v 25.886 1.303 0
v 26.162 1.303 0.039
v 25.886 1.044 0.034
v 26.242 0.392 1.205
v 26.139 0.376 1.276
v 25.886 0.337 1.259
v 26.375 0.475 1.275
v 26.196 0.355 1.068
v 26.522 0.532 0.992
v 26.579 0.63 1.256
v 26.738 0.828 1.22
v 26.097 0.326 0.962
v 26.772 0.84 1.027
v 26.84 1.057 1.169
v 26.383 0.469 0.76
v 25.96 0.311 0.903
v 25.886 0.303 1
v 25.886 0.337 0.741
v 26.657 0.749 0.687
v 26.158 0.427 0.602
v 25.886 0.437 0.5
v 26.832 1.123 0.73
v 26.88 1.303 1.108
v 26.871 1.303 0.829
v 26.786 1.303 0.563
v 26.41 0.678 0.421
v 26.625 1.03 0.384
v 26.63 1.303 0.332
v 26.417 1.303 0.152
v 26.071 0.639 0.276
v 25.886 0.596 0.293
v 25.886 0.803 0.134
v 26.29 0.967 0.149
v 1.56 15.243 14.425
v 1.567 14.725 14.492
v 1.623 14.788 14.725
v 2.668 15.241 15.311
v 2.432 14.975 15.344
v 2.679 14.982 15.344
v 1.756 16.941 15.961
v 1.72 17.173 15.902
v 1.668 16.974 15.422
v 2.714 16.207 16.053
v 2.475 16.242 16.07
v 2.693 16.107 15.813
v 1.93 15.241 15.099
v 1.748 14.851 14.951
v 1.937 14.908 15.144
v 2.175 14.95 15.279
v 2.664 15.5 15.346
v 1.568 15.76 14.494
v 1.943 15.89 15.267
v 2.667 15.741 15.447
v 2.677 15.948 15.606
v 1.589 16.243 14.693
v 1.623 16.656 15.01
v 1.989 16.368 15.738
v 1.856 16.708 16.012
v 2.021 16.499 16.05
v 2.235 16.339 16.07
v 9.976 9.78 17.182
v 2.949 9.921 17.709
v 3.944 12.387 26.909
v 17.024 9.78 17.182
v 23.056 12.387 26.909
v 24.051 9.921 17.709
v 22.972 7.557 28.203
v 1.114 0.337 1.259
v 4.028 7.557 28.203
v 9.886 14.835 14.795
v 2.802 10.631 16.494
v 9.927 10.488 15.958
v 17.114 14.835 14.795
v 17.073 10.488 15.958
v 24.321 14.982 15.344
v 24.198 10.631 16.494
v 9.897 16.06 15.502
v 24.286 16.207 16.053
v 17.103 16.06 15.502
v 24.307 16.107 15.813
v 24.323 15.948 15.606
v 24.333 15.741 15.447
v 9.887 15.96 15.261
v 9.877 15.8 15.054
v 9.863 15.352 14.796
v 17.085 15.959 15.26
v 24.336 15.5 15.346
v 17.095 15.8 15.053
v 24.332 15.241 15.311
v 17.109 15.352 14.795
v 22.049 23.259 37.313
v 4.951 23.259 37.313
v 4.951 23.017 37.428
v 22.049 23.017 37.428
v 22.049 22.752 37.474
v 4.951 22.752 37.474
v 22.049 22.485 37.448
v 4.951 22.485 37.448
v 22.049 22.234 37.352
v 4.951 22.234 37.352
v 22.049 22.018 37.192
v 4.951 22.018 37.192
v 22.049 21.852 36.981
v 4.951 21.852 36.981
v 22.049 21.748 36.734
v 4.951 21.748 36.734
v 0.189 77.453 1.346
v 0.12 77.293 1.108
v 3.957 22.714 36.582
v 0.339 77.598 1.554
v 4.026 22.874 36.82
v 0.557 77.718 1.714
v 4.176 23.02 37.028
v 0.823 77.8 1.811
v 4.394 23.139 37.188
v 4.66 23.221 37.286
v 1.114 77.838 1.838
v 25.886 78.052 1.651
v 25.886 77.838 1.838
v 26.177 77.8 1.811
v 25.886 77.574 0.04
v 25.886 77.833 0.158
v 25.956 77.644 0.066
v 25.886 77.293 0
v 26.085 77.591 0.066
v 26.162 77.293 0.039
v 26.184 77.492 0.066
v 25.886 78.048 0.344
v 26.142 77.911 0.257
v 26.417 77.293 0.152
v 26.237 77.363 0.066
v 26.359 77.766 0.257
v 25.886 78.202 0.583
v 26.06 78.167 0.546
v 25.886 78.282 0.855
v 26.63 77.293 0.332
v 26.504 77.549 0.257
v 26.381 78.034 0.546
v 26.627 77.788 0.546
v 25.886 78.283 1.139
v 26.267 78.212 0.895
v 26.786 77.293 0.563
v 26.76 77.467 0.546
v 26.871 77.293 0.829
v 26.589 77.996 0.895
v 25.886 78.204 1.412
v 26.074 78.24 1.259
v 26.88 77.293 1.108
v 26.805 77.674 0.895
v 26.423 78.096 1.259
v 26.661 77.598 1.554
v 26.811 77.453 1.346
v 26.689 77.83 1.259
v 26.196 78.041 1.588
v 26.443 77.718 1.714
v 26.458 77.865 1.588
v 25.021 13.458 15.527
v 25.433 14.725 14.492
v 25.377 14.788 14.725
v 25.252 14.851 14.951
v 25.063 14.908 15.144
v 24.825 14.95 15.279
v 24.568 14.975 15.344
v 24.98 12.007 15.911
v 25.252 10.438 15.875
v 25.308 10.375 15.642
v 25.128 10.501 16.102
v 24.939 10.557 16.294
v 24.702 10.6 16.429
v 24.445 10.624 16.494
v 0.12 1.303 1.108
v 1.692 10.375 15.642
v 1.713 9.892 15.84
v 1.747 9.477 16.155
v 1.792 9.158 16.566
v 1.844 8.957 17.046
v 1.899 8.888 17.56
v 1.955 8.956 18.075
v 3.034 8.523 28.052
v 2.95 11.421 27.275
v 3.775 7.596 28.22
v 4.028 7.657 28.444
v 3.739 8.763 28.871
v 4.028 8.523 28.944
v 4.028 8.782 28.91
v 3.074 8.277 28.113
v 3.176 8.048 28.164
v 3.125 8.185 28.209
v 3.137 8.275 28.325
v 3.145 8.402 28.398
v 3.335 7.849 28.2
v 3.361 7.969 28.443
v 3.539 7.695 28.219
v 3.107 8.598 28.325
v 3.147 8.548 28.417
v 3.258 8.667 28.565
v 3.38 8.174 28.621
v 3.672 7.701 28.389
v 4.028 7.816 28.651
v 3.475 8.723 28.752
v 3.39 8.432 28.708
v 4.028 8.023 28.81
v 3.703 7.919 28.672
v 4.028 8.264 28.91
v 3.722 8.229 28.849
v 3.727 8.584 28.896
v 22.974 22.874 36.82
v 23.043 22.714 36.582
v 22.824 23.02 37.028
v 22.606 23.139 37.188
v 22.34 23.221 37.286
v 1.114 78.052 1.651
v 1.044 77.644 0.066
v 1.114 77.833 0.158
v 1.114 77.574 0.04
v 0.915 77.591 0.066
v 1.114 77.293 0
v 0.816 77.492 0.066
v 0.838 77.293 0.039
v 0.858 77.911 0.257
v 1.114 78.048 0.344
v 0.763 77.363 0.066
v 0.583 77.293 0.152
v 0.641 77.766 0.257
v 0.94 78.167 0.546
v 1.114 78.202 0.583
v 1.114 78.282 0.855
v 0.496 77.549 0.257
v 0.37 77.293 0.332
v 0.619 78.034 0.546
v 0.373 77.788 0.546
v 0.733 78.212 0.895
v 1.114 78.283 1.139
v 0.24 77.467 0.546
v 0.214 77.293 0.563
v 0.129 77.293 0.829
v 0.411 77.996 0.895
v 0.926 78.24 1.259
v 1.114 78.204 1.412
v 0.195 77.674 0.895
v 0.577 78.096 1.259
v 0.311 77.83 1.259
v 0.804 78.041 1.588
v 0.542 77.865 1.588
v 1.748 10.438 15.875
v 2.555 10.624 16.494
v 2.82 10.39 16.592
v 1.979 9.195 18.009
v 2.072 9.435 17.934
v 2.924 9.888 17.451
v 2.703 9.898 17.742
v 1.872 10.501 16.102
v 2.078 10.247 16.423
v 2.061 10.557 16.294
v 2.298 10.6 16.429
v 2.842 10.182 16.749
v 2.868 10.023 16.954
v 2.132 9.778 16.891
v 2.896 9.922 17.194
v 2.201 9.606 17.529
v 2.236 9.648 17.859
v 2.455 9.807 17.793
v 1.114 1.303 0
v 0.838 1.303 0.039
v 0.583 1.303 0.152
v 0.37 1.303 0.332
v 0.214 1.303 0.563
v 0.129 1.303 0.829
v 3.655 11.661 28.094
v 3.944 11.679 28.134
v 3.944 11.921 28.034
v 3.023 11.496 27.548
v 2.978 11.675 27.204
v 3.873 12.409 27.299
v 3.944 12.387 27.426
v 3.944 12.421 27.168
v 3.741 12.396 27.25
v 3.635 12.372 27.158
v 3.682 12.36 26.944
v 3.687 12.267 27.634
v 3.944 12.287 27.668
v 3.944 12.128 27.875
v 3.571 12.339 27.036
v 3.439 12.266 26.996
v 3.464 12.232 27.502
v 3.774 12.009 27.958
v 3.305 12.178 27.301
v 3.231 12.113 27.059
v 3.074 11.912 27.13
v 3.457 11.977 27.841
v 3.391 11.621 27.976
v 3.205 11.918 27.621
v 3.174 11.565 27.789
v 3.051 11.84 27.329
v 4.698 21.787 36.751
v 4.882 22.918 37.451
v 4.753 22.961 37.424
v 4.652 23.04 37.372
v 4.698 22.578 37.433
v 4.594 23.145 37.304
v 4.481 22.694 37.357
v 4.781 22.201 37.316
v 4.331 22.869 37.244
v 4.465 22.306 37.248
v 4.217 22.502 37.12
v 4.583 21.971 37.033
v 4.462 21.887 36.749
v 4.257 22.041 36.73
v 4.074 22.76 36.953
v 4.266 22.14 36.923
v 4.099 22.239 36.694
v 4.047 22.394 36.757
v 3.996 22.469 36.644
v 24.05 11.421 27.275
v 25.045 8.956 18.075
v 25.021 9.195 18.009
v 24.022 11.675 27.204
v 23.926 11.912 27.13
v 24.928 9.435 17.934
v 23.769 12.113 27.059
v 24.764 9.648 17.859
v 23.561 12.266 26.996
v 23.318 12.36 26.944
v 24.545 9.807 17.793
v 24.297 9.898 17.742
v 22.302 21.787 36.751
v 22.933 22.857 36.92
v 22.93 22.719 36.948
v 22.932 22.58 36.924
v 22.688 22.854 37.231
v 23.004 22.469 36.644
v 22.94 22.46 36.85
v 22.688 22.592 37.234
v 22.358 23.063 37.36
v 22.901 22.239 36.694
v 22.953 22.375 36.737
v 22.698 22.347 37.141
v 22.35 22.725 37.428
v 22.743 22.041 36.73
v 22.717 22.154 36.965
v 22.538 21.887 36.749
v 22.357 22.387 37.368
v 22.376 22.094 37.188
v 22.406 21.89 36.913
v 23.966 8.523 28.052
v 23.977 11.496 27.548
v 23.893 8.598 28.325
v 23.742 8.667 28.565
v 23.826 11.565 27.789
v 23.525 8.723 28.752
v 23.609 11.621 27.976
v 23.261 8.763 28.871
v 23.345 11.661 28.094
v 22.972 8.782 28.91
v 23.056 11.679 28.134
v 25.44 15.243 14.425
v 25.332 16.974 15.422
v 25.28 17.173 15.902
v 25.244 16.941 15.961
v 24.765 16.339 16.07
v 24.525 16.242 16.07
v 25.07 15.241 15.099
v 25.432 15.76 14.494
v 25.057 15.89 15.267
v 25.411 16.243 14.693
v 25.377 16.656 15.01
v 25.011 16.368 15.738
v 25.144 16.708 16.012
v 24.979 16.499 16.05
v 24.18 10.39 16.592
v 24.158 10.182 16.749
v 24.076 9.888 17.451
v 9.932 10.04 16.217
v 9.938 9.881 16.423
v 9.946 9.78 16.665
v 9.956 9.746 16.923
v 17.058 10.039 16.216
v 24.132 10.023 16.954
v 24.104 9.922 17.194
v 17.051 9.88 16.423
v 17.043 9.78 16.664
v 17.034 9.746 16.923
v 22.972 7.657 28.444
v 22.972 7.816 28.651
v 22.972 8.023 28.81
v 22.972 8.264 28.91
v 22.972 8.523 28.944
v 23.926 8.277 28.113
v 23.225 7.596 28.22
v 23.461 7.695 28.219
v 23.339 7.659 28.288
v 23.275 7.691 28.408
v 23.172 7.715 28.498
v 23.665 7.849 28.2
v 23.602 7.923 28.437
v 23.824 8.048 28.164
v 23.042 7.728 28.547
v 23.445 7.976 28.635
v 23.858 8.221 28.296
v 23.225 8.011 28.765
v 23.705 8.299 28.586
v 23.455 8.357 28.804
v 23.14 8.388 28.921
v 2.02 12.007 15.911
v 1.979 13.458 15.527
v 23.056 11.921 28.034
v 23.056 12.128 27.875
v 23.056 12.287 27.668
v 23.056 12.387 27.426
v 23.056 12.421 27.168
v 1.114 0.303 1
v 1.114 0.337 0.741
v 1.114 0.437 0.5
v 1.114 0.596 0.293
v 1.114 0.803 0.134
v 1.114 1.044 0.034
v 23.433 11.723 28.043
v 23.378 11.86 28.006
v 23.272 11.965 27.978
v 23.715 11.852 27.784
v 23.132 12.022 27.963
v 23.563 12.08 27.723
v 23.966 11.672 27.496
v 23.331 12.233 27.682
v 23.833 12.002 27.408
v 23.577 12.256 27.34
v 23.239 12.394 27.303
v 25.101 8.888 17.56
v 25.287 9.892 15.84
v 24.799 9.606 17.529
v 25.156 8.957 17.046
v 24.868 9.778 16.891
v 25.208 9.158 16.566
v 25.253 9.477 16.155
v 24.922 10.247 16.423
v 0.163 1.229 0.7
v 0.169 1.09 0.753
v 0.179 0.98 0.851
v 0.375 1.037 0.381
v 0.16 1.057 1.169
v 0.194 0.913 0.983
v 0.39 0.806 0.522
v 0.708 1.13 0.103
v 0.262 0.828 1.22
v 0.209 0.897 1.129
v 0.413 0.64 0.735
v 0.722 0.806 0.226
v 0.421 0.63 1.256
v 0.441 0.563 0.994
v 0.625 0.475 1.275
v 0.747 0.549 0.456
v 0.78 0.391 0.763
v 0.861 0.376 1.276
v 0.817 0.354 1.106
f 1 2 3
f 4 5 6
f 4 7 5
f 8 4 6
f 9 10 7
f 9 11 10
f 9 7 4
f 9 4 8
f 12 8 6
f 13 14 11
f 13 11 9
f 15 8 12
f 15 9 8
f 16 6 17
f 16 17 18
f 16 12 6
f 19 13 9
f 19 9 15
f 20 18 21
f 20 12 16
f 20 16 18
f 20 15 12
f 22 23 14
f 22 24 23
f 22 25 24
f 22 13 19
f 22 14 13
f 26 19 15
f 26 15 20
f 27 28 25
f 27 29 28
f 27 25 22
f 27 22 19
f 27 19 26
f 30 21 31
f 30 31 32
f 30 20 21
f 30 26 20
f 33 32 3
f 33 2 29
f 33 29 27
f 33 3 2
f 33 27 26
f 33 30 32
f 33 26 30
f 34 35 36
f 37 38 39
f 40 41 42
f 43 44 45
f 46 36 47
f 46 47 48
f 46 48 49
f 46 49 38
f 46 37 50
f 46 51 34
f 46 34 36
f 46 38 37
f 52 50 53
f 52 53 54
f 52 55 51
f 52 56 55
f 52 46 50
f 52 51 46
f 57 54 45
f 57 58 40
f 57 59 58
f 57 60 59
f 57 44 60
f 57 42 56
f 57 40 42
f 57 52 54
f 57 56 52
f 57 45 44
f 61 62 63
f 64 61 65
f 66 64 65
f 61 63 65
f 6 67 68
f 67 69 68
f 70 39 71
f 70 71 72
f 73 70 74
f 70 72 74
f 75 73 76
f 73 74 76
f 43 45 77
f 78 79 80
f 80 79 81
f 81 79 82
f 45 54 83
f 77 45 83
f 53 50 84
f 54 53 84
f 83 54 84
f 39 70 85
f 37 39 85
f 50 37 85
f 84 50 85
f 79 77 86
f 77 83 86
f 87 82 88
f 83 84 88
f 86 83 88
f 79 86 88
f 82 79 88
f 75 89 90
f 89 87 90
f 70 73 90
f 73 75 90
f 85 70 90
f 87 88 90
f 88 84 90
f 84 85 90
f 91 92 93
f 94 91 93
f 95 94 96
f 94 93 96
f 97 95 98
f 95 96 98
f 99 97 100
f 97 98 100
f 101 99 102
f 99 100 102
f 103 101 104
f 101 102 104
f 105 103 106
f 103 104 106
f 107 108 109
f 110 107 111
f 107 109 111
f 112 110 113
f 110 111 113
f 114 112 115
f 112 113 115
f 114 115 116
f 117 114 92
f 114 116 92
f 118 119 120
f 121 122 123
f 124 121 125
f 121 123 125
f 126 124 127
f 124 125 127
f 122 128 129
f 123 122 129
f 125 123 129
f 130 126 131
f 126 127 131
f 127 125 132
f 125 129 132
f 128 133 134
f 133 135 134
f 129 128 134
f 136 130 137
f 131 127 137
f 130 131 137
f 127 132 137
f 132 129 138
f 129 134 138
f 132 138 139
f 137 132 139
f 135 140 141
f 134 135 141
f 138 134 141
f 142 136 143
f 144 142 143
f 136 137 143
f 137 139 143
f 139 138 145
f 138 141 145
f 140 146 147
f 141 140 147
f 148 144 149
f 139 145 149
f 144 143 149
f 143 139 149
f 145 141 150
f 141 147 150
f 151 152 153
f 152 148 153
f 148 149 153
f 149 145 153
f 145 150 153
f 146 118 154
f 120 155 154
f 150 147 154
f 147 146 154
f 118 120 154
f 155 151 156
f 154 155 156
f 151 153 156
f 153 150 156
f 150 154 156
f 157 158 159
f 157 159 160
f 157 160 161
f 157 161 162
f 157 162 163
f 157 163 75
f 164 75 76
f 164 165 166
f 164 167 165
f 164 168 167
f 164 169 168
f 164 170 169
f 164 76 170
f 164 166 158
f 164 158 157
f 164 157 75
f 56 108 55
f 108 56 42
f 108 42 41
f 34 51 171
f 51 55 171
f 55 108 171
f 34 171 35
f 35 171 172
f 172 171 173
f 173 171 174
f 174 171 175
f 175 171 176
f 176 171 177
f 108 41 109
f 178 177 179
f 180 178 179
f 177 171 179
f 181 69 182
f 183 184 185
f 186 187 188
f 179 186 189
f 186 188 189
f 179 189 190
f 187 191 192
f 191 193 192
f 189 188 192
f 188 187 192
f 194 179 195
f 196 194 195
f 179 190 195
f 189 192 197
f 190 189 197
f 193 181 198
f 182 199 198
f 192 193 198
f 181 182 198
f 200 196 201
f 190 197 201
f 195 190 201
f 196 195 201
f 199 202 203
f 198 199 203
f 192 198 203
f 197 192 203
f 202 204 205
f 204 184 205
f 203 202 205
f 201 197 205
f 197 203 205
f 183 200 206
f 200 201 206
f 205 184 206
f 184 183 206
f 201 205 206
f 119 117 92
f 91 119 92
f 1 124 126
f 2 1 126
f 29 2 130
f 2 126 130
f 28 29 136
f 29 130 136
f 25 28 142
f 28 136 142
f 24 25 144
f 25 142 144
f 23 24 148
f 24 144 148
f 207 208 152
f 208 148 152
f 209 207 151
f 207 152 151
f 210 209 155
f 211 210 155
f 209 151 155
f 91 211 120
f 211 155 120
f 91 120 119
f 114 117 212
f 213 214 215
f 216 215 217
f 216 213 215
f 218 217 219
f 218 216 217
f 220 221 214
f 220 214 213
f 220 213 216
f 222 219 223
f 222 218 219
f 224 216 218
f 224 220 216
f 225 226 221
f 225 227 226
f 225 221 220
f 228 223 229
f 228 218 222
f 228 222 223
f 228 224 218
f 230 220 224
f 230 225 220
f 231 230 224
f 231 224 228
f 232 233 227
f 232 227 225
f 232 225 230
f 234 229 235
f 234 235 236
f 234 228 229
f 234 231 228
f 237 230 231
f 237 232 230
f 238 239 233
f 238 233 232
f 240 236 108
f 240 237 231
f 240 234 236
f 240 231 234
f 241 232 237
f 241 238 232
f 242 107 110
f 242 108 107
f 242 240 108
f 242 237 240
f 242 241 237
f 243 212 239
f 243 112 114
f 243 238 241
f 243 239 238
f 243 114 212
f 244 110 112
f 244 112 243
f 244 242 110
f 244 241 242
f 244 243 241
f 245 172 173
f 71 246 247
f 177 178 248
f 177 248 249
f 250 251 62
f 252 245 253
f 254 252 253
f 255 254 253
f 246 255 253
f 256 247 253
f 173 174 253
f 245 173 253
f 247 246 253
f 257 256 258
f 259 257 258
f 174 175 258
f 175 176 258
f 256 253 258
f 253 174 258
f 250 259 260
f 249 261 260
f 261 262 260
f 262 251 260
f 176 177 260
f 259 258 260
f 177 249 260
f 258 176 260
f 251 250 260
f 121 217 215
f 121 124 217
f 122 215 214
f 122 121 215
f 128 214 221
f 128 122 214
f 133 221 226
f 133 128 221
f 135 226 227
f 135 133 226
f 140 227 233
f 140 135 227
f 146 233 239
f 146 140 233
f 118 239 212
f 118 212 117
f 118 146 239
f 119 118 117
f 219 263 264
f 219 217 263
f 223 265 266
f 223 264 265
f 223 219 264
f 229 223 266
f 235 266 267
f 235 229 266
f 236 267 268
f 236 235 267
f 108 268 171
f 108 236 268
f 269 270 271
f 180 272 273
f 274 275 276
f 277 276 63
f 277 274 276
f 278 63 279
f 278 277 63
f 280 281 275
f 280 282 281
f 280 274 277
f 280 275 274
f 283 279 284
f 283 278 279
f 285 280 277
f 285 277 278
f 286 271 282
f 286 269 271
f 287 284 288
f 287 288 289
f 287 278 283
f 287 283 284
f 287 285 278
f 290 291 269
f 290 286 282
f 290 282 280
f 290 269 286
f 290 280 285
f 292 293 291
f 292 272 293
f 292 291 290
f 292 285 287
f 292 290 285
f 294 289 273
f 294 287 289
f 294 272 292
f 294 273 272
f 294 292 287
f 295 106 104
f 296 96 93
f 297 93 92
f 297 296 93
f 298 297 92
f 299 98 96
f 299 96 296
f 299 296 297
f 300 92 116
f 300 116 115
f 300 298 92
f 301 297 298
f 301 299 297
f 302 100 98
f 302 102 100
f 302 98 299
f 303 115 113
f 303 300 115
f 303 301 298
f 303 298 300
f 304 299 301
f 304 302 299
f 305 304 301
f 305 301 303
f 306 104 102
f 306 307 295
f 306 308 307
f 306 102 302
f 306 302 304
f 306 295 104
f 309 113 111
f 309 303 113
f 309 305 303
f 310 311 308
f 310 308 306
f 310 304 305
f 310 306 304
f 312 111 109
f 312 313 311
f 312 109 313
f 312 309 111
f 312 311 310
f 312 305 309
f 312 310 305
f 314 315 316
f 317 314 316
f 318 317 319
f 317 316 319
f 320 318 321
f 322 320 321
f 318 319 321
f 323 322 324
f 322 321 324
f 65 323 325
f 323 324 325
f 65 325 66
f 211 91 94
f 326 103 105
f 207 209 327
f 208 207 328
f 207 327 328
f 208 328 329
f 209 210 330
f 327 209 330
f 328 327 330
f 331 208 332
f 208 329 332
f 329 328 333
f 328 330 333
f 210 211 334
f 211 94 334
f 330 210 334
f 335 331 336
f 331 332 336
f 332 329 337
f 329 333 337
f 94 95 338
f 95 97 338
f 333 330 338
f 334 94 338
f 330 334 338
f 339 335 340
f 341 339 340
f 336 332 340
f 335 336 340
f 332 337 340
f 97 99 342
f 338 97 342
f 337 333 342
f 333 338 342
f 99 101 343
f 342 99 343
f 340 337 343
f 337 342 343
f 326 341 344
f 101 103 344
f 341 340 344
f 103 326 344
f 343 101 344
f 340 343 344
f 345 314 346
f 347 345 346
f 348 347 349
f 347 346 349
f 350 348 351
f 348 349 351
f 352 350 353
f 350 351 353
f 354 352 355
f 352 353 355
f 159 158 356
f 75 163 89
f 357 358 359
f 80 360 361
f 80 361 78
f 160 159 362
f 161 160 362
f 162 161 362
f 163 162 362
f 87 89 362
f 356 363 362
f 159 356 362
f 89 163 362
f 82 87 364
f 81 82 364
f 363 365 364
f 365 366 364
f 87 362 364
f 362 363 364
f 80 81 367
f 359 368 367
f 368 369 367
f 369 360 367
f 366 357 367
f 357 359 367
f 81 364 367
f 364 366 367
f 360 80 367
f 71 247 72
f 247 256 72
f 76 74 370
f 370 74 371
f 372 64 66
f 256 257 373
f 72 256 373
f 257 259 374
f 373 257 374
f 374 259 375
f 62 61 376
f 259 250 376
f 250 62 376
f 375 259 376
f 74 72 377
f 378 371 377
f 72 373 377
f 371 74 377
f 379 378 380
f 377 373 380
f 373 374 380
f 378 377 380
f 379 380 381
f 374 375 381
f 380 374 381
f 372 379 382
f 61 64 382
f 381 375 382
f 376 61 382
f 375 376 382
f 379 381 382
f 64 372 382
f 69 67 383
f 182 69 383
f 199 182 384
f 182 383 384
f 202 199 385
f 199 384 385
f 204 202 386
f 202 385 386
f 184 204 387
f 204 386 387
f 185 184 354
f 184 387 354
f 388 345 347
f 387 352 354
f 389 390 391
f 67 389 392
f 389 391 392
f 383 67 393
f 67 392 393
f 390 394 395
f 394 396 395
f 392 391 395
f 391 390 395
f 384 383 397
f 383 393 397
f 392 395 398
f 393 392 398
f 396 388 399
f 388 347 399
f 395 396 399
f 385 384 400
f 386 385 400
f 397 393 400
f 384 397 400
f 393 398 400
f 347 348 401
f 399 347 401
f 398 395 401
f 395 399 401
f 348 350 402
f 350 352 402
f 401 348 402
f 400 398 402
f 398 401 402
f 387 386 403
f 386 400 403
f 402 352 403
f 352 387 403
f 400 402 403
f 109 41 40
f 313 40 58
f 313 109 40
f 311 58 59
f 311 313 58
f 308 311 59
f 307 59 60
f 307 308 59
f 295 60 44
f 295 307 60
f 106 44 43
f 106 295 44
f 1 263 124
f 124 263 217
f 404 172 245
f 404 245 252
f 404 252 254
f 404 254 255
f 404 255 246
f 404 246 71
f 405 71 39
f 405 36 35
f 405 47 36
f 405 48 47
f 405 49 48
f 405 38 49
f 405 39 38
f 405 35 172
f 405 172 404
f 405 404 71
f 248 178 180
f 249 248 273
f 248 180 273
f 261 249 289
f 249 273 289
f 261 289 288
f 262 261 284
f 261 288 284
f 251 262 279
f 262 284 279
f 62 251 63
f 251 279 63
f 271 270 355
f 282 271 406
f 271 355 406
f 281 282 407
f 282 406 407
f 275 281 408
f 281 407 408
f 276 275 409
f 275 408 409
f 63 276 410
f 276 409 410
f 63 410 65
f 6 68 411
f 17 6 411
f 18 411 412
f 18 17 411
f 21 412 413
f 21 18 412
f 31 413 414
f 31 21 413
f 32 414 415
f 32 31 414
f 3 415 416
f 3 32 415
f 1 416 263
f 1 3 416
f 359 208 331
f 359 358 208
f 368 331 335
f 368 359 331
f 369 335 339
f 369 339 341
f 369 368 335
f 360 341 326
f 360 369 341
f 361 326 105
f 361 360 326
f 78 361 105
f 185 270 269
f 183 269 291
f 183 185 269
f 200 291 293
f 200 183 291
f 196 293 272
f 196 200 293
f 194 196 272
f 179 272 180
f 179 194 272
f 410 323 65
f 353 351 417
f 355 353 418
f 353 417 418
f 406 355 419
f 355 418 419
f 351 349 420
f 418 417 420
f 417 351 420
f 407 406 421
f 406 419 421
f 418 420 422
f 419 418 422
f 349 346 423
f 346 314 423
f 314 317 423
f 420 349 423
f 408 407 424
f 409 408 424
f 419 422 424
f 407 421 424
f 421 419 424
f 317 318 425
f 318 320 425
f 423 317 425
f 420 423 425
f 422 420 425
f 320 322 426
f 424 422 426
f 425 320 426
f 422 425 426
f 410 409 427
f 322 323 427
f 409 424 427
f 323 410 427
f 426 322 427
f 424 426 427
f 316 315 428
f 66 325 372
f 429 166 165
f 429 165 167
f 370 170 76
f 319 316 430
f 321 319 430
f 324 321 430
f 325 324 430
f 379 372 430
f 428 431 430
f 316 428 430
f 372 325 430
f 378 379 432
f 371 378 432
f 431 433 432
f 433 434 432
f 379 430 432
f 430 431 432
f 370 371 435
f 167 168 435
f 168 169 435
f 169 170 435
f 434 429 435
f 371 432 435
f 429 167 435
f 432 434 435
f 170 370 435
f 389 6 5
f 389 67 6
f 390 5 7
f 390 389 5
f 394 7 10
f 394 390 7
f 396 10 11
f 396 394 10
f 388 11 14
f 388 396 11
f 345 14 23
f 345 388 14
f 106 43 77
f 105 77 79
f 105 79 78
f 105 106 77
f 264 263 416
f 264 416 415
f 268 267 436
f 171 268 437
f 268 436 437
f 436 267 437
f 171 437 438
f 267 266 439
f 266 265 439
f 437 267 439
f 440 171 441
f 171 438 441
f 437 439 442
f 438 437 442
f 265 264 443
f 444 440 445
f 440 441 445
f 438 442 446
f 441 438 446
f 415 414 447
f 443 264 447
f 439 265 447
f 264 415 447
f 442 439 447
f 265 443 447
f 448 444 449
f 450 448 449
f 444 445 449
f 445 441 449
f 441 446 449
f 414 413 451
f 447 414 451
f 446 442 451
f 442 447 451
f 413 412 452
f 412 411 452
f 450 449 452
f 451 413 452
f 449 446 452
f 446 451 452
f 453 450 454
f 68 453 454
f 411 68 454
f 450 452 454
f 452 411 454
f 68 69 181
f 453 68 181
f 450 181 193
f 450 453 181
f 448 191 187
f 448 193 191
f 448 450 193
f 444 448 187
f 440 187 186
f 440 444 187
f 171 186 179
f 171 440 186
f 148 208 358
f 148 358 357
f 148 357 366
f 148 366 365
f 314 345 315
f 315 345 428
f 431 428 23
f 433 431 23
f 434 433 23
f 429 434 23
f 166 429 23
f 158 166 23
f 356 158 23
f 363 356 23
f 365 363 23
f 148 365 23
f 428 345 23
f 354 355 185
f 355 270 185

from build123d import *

# Parameters (mm, degrees)
F1_DEPTH = 27
F3_R     = 91.9406887246
F4_DEPTH = 6.5
F6_DEPTH = 43.7
F8_DEPTH = 96
F9_R     = 1


with BuildPart() as f1:
    # F0 (on Right) → F1 (new body)
    with BuildSketch(Plane.YZ):
        Polygon((10.3527618041, 38.6370330516), (0, 0), (80.6664137916, 0), (21.2226228125, 38.6370330516), align=None)
    extrude(amount=F1_DEPTH)

    # F3 (on offset) → F4 (cut)
    with BuildSketch(Plane(origin=(0, 4.8296291314, -1.2940952255), x_dir=(1, 0, 0), z_dir=(0, -0.9659258263, 0.2588190451))):
        with Locations((13.5, 110)):
            Circle(F3_R)
    extrude(amount=-F4_DEPTH, mode=Mode.SUBTRACT)

    # F5 (on face) → F6 (cut)
    with BuildSketch(Plane(origin=(0, 0, 0), x_dir=(0, -1, 0), z_dir=(-1, 0, 0))):
        Polygon((-18.6758581549, 34.7778759897), (-12.6453930714, 27.8747328985), (-15.5291427062, 38.6370330516), (-10.3527618041, 38.6370330516), (-7.81576394, 29.168828124), (-5.5674631149, 30.5033978075), (-7.2772535495, 43.6117947102), (-16.111170873, 47.3163388669), align=None)
        Polygon((-15.5291427062, 38.6370330516), (-12.6453930714, 27.8747328985), (-7.81576394, 29.168828124), (-10.3527618041, 38.6370330516), align=None)
    extrude(amount=-F6_DEPTH, mode=Mode.SUBTRACT)

    # F7 (on Front) → F8 (cut)
    with BuildSketch(Plane.XZ):
        Polygon((21.458028581, 51.2392446399), (27, 0), (40.6126193702, -9.302303195), (49.8705804348, 59.140522033), align=None)
        Polygon((-22.2092997283, -20.874761045), (0, 0), (5.541971419, 51.2392446399), (-20.2254503965, 29.3827727437), align=None)
    extrude(amount=-F8_DEPTH, mode=Mode.SUBTRACT)

    # F9
    f9_edges = [f1.edges().sort_by_distance(p)[0] for p in [
        (2.880945, 19.042842, 26.636267),
        (13.5, 22.104798, 38.063641),
        (2.058457, 51.385606, 19.03182),
        (24.941543, 51.385606, 19.03182),
        (13.5, 80.666414, 0),
        (24.119055, 19.042842, 26.636267),
        (13.5, 15.782241, 14.467536),
        (24.580296, 11.170883, 22.371787),
        (27, 40.333207, 0),
        (25.265261, 12.838619, 16.038825),
        (23.915121, 10.230579, 28.521781),
        (25.422568, 3.907882, 14.584414),
        (13.5, 0, 0),
        (0, 40.333207, 0),
        (13.5, 7.815764, 29.168828),
        (1.577432, 3.907882, 14.584414),
        (13.5, 9.503723, 16.14986),
        (1.734739, 12.838619, 16.038825),
        (3.084879, 10.230579, 28.521781),
        (13.5, 12.645393, 27.874733),
        (2.419704, 11.170883, 22.371787),
    ]]
    fillet(f9_edges, radius=F9_R)


solid = f1.part
